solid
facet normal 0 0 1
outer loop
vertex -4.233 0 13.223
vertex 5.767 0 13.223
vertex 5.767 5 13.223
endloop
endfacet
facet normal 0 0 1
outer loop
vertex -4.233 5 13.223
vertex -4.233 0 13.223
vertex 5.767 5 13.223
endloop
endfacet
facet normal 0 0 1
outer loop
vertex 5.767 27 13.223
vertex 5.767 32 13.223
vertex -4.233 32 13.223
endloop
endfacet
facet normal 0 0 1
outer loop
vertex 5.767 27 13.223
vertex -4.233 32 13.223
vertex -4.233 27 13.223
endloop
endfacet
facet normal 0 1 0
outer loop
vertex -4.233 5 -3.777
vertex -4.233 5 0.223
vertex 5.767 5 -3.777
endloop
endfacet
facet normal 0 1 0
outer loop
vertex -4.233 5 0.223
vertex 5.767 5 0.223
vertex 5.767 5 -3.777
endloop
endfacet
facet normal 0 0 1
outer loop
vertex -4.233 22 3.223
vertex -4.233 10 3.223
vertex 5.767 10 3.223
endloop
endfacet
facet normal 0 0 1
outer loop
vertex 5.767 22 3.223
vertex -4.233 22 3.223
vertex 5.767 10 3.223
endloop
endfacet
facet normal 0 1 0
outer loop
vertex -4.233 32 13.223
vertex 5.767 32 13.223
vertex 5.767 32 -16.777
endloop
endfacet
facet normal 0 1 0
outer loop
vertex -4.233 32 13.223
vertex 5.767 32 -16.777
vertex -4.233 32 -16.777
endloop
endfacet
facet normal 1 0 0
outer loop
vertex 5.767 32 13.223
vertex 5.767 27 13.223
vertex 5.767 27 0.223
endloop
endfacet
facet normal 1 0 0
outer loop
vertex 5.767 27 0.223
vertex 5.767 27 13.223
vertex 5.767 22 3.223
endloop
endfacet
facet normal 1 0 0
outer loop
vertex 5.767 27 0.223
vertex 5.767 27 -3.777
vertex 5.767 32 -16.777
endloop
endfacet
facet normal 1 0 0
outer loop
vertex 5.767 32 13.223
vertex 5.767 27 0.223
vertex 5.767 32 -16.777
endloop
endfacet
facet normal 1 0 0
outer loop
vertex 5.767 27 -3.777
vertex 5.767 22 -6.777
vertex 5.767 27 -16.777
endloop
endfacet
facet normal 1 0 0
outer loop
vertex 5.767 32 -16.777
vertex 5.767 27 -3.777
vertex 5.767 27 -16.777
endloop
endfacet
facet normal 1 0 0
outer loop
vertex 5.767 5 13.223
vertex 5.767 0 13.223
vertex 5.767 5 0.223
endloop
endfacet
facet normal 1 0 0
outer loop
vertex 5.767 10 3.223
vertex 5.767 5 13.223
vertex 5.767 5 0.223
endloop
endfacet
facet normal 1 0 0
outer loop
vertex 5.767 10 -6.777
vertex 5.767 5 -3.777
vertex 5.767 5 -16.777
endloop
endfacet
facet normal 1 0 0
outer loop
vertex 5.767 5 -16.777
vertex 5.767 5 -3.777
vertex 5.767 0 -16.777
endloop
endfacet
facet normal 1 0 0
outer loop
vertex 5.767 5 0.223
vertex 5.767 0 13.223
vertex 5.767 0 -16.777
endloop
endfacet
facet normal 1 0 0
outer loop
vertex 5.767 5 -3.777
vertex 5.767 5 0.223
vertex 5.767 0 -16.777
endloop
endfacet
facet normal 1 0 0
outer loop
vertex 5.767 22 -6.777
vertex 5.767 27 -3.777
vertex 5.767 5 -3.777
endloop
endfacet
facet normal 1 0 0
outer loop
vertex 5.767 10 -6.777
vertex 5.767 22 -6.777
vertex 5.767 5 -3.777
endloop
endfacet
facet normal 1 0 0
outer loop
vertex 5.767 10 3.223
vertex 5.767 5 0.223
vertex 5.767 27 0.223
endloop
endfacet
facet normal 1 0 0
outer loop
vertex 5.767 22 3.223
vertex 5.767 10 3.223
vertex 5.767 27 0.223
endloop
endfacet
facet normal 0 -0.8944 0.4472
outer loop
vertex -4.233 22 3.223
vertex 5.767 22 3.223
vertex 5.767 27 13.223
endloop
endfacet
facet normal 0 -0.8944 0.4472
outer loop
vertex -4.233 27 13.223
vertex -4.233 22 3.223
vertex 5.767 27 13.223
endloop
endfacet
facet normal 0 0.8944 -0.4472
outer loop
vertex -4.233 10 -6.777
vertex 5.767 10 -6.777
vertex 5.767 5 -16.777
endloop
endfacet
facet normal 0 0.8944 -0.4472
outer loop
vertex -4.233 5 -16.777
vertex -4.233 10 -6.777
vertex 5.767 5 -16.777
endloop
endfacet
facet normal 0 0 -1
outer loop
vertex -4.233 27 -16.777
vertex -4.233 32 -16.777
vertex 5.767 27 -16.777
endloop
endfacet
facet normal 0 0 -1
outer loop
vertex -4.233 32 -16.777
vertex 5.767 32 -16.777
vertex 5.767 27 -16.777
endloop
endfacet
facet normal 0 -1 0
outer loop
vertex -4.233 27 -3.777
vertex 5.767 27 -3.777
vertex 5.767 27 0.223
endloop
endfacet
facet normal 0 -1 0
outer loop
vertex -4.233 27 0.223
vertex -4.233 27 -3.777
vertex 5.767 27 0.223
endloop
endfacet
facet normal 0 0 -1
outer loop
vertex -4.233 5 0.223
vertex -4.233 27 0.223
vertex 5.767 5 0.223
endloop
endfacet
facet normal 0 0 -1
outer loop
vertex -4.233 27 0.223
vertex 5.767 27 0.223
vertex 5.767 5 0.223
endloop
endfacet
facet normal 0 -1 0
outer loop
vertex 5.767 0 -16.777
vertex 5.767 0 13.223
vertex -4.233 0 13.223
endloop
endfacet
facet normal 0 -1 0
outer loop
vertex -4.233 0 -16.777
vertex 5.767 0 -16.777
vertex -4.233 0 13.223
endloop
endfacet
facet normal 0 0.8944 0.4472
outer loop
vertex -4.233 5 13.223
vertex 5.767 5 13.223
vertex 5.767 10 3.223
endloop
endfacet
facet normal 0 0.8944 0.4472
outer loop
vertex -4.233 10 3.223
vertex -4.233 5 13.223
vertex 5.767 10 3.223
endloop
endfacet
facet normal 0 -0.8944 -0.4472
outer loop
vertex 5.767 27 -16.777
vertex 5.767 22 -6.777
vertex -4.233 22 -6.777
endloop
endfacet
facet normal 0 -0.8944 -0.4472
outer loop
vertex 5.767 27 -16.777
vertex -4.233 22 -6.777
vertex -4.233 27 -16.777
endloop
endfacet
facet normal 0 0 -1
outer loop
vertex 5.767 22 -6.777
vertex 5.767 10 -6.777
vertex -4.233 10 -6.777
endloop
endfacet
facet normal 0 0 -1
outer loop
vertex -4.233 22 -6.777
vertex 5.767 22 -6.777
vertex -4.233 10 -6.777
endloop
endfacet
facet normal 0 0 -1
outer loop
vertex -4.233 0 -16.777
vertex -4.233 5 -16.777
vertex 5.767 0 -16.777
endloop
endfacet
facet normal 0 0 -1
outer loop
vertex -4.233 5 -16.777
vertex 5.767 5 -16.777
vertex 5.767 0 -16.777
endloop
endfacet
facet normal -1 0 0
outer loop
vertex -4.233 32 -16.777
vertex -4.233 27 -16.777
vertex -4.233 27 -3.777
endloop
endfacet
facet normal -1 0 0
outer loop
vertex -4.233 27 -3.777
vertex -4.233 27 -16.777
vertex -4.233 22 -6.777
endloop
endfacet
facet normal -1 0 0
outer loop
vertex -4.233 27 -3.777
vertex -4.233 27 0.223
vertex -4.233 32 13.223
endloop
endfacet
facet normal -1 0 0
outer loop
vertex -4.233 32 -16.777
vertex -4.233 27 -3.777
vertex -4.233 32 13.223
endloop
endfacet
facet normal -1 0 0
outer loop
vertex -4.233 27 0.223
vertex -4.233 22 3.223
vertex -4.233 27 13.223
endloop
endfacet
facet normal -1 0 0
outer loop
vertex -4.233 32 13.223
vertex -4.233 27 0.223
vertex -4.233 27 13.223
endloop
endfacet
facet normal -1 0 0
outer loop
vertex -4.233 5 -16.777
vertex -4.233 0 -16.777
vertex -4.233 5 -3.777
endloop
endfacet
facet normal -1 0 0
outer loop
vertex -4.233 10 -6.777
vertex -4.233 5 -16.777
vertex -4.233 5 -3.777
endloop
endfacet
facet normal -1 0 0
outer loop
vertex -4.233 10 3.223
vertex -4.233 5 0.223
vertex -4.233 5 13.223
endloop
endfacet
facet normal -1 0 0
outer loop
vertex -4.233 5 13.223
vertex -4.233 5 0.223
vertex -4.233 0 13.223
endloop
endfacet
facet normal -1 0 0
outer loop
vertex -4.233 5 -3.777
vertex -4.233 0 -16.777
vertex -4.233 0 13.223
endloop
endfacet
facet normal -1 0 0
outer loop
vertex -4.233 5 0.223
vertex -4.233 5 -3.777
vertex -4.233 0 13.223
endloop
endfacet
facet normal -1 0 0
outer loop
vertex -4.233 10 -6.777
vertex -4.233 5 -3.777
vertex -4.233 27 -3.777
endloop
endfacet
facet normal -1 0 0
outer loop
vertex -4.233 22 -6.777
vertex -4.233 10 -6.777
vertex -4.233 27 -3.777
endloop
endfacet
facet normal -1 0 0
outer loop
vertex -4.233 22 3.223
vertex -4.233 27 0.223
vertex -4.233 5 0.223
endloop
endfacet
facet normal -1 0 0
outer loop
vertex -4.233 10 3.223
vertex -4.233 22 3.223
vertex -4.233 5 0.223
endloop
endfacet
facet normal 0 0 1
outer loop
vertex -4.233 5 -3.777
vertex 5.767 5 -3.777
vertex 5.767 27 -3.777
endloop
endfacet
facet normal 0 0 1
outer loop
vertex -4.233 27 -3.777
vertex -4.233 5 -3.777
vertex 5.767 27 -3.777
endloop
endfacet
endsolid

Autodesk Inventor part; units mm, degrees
ref_plane "YZ Plane" through (0, 0, 0) normal (1, 0, 0) x (0, 1, 0)
ref_plane "XZ Plane" through (0, 0, 0) normal (0, 1, 0) x (-1, 0, 0)
ref_plane "XY Plane" through (0, 0, 0) normal (0, 0, 1) x (1, 0, 0)
sketch "Sketch1" plane through (0, 0, 0) normal (0, 1, 0) x (-1, 0, 0)
  line L0 (4.2334, 3.223) -> (-5.7666, 3.223)
  line L1 (-5.7666, 3.223) -> (-5.7666, -6.777)
  line L2 (-5.7666, -6.777) -> (4.2334, -6.777)
  line L3 (4.2334, -6.777) -> (4.2334, 3.223)
  point P0 (0, 0)
  dimension "d0" = 10
  dimension "d1" = 10
extrude "Extrusion1" add sketch "Sketch1" along normal blind 32
sketch "Sketch2" plane through (5.7666, 0, 3.223) normal (1, 0, 0) x (0, 0, -1)
  line L0 (0, 0) -> (10, 0) projected
  line L1 (0, 0) -> (0, 32) projected
  line L2 (10, 0) -> (0, 0)
  line L3 (0, 0) -> (0, 10)
  line L4 (0, 10) -> (10, 10)
  line L5 (10, 10) -> (10, 0)
  line L6 (0, 0) -> (-10, 0)
  line L7 (-10, 0) -> (-10, 10)
  line L8 (-10, 10) -> (0, 10)
  line L9 (0, 10) -> (0, 0)
  line L10 (10, 10) -> (20, 10)
  line L11 (20, 10) -> (20, 0)
  line L12 (20, 0) -> (10, 0)
  line L13 (10, 0) -> (10, 10)
  line L14 (-10, 5) -> (0, 10)
  line L15 (10, 10) -> (20, 5)
  point P0 (3.223, 0)
  point P1 (10, 5)
  dimension "d4" = 10
  dimension "d5" = 10
  dimension "d6" = 10
extrude "Extrusion2" add sketch "Sketch2" against normal blind 10 contours L6 L7 L14 L1 | L5 L15 L11 L12
sketch "Sketch3" plane through (5.7666, 32, 3.223) normal (1, 0, 0) x (0, 0, -1)
  line L0 (10, 0) -> (0, 0) projected
  line L1 (10, -22) -> (10, 0) projected
  line L2 (0, 0) -> (10, 0)
  line L3 (10, 0) -> (10, -10)
  line L4 (10, -10) -> (0, -10)
  line L5 (0, -10) -> (0, 0)
  line L6 (0, 0) -> (-10, 0)
  line L7 (-10, 0) -> (-10, -10)
  line L8 (-10, -10) -> (0, -10)
  line L9 (0, -10) -> (0, 0)
  line L10 (10, 0) -> (20, 0)
  line L11 (20, 0) -> (20, -10)
  line L12 (20, -10) -> (10, -10)
  line L13 (10, -10) -> (10, 0)
  line L14 (0, -10) -> (-10, -5)
  line L15 (10, -10) -> (20, -5)
  point P0 (3.223, -32)
  point P1 (0, -10)
  dimension "d9" = 10
  dimension "d10" = 10
  dimension "d11" = 10
extrude "Extrusion3" add sketch "Sketch3" against normal blind 10 contours L10 L11 L15 L1 | L5 L14 L7 L6
sketch "Sketch4" plane through (5.7666, 0, -16.777) normal (1, 0, 0) x (0, 0, -1)
  line L0 (-13, 27) -> (-17, 27)
  line L1 (-17, 27) -> (-17, 5)
  line L2 (-17, 5) -> (-13, 5)
  line L3 (-13, 5) -> (-13, 27)
  line L4 (0, 32) -> (-30, 32) projected
  line L5 (-30, 0) -> (0, 0) projected
  line L6 (-10, 10) -> (-10, 22) projected
  line L7 (-20, 10) -> (-20, 22) projected
  point P0 (-16.777, 0)
  point P1 (-15, 32)
  point P2 (-15, 27)
  point P3 (-15, 5)
  dimension "d14" = 5
  dimension "d15" = 5
  dimension "d16" = 3
  dimension "d17" = 3
extrude "Extrusion4" cut sketch "Sketch4" against normal blind 10
properties part number "stand"
